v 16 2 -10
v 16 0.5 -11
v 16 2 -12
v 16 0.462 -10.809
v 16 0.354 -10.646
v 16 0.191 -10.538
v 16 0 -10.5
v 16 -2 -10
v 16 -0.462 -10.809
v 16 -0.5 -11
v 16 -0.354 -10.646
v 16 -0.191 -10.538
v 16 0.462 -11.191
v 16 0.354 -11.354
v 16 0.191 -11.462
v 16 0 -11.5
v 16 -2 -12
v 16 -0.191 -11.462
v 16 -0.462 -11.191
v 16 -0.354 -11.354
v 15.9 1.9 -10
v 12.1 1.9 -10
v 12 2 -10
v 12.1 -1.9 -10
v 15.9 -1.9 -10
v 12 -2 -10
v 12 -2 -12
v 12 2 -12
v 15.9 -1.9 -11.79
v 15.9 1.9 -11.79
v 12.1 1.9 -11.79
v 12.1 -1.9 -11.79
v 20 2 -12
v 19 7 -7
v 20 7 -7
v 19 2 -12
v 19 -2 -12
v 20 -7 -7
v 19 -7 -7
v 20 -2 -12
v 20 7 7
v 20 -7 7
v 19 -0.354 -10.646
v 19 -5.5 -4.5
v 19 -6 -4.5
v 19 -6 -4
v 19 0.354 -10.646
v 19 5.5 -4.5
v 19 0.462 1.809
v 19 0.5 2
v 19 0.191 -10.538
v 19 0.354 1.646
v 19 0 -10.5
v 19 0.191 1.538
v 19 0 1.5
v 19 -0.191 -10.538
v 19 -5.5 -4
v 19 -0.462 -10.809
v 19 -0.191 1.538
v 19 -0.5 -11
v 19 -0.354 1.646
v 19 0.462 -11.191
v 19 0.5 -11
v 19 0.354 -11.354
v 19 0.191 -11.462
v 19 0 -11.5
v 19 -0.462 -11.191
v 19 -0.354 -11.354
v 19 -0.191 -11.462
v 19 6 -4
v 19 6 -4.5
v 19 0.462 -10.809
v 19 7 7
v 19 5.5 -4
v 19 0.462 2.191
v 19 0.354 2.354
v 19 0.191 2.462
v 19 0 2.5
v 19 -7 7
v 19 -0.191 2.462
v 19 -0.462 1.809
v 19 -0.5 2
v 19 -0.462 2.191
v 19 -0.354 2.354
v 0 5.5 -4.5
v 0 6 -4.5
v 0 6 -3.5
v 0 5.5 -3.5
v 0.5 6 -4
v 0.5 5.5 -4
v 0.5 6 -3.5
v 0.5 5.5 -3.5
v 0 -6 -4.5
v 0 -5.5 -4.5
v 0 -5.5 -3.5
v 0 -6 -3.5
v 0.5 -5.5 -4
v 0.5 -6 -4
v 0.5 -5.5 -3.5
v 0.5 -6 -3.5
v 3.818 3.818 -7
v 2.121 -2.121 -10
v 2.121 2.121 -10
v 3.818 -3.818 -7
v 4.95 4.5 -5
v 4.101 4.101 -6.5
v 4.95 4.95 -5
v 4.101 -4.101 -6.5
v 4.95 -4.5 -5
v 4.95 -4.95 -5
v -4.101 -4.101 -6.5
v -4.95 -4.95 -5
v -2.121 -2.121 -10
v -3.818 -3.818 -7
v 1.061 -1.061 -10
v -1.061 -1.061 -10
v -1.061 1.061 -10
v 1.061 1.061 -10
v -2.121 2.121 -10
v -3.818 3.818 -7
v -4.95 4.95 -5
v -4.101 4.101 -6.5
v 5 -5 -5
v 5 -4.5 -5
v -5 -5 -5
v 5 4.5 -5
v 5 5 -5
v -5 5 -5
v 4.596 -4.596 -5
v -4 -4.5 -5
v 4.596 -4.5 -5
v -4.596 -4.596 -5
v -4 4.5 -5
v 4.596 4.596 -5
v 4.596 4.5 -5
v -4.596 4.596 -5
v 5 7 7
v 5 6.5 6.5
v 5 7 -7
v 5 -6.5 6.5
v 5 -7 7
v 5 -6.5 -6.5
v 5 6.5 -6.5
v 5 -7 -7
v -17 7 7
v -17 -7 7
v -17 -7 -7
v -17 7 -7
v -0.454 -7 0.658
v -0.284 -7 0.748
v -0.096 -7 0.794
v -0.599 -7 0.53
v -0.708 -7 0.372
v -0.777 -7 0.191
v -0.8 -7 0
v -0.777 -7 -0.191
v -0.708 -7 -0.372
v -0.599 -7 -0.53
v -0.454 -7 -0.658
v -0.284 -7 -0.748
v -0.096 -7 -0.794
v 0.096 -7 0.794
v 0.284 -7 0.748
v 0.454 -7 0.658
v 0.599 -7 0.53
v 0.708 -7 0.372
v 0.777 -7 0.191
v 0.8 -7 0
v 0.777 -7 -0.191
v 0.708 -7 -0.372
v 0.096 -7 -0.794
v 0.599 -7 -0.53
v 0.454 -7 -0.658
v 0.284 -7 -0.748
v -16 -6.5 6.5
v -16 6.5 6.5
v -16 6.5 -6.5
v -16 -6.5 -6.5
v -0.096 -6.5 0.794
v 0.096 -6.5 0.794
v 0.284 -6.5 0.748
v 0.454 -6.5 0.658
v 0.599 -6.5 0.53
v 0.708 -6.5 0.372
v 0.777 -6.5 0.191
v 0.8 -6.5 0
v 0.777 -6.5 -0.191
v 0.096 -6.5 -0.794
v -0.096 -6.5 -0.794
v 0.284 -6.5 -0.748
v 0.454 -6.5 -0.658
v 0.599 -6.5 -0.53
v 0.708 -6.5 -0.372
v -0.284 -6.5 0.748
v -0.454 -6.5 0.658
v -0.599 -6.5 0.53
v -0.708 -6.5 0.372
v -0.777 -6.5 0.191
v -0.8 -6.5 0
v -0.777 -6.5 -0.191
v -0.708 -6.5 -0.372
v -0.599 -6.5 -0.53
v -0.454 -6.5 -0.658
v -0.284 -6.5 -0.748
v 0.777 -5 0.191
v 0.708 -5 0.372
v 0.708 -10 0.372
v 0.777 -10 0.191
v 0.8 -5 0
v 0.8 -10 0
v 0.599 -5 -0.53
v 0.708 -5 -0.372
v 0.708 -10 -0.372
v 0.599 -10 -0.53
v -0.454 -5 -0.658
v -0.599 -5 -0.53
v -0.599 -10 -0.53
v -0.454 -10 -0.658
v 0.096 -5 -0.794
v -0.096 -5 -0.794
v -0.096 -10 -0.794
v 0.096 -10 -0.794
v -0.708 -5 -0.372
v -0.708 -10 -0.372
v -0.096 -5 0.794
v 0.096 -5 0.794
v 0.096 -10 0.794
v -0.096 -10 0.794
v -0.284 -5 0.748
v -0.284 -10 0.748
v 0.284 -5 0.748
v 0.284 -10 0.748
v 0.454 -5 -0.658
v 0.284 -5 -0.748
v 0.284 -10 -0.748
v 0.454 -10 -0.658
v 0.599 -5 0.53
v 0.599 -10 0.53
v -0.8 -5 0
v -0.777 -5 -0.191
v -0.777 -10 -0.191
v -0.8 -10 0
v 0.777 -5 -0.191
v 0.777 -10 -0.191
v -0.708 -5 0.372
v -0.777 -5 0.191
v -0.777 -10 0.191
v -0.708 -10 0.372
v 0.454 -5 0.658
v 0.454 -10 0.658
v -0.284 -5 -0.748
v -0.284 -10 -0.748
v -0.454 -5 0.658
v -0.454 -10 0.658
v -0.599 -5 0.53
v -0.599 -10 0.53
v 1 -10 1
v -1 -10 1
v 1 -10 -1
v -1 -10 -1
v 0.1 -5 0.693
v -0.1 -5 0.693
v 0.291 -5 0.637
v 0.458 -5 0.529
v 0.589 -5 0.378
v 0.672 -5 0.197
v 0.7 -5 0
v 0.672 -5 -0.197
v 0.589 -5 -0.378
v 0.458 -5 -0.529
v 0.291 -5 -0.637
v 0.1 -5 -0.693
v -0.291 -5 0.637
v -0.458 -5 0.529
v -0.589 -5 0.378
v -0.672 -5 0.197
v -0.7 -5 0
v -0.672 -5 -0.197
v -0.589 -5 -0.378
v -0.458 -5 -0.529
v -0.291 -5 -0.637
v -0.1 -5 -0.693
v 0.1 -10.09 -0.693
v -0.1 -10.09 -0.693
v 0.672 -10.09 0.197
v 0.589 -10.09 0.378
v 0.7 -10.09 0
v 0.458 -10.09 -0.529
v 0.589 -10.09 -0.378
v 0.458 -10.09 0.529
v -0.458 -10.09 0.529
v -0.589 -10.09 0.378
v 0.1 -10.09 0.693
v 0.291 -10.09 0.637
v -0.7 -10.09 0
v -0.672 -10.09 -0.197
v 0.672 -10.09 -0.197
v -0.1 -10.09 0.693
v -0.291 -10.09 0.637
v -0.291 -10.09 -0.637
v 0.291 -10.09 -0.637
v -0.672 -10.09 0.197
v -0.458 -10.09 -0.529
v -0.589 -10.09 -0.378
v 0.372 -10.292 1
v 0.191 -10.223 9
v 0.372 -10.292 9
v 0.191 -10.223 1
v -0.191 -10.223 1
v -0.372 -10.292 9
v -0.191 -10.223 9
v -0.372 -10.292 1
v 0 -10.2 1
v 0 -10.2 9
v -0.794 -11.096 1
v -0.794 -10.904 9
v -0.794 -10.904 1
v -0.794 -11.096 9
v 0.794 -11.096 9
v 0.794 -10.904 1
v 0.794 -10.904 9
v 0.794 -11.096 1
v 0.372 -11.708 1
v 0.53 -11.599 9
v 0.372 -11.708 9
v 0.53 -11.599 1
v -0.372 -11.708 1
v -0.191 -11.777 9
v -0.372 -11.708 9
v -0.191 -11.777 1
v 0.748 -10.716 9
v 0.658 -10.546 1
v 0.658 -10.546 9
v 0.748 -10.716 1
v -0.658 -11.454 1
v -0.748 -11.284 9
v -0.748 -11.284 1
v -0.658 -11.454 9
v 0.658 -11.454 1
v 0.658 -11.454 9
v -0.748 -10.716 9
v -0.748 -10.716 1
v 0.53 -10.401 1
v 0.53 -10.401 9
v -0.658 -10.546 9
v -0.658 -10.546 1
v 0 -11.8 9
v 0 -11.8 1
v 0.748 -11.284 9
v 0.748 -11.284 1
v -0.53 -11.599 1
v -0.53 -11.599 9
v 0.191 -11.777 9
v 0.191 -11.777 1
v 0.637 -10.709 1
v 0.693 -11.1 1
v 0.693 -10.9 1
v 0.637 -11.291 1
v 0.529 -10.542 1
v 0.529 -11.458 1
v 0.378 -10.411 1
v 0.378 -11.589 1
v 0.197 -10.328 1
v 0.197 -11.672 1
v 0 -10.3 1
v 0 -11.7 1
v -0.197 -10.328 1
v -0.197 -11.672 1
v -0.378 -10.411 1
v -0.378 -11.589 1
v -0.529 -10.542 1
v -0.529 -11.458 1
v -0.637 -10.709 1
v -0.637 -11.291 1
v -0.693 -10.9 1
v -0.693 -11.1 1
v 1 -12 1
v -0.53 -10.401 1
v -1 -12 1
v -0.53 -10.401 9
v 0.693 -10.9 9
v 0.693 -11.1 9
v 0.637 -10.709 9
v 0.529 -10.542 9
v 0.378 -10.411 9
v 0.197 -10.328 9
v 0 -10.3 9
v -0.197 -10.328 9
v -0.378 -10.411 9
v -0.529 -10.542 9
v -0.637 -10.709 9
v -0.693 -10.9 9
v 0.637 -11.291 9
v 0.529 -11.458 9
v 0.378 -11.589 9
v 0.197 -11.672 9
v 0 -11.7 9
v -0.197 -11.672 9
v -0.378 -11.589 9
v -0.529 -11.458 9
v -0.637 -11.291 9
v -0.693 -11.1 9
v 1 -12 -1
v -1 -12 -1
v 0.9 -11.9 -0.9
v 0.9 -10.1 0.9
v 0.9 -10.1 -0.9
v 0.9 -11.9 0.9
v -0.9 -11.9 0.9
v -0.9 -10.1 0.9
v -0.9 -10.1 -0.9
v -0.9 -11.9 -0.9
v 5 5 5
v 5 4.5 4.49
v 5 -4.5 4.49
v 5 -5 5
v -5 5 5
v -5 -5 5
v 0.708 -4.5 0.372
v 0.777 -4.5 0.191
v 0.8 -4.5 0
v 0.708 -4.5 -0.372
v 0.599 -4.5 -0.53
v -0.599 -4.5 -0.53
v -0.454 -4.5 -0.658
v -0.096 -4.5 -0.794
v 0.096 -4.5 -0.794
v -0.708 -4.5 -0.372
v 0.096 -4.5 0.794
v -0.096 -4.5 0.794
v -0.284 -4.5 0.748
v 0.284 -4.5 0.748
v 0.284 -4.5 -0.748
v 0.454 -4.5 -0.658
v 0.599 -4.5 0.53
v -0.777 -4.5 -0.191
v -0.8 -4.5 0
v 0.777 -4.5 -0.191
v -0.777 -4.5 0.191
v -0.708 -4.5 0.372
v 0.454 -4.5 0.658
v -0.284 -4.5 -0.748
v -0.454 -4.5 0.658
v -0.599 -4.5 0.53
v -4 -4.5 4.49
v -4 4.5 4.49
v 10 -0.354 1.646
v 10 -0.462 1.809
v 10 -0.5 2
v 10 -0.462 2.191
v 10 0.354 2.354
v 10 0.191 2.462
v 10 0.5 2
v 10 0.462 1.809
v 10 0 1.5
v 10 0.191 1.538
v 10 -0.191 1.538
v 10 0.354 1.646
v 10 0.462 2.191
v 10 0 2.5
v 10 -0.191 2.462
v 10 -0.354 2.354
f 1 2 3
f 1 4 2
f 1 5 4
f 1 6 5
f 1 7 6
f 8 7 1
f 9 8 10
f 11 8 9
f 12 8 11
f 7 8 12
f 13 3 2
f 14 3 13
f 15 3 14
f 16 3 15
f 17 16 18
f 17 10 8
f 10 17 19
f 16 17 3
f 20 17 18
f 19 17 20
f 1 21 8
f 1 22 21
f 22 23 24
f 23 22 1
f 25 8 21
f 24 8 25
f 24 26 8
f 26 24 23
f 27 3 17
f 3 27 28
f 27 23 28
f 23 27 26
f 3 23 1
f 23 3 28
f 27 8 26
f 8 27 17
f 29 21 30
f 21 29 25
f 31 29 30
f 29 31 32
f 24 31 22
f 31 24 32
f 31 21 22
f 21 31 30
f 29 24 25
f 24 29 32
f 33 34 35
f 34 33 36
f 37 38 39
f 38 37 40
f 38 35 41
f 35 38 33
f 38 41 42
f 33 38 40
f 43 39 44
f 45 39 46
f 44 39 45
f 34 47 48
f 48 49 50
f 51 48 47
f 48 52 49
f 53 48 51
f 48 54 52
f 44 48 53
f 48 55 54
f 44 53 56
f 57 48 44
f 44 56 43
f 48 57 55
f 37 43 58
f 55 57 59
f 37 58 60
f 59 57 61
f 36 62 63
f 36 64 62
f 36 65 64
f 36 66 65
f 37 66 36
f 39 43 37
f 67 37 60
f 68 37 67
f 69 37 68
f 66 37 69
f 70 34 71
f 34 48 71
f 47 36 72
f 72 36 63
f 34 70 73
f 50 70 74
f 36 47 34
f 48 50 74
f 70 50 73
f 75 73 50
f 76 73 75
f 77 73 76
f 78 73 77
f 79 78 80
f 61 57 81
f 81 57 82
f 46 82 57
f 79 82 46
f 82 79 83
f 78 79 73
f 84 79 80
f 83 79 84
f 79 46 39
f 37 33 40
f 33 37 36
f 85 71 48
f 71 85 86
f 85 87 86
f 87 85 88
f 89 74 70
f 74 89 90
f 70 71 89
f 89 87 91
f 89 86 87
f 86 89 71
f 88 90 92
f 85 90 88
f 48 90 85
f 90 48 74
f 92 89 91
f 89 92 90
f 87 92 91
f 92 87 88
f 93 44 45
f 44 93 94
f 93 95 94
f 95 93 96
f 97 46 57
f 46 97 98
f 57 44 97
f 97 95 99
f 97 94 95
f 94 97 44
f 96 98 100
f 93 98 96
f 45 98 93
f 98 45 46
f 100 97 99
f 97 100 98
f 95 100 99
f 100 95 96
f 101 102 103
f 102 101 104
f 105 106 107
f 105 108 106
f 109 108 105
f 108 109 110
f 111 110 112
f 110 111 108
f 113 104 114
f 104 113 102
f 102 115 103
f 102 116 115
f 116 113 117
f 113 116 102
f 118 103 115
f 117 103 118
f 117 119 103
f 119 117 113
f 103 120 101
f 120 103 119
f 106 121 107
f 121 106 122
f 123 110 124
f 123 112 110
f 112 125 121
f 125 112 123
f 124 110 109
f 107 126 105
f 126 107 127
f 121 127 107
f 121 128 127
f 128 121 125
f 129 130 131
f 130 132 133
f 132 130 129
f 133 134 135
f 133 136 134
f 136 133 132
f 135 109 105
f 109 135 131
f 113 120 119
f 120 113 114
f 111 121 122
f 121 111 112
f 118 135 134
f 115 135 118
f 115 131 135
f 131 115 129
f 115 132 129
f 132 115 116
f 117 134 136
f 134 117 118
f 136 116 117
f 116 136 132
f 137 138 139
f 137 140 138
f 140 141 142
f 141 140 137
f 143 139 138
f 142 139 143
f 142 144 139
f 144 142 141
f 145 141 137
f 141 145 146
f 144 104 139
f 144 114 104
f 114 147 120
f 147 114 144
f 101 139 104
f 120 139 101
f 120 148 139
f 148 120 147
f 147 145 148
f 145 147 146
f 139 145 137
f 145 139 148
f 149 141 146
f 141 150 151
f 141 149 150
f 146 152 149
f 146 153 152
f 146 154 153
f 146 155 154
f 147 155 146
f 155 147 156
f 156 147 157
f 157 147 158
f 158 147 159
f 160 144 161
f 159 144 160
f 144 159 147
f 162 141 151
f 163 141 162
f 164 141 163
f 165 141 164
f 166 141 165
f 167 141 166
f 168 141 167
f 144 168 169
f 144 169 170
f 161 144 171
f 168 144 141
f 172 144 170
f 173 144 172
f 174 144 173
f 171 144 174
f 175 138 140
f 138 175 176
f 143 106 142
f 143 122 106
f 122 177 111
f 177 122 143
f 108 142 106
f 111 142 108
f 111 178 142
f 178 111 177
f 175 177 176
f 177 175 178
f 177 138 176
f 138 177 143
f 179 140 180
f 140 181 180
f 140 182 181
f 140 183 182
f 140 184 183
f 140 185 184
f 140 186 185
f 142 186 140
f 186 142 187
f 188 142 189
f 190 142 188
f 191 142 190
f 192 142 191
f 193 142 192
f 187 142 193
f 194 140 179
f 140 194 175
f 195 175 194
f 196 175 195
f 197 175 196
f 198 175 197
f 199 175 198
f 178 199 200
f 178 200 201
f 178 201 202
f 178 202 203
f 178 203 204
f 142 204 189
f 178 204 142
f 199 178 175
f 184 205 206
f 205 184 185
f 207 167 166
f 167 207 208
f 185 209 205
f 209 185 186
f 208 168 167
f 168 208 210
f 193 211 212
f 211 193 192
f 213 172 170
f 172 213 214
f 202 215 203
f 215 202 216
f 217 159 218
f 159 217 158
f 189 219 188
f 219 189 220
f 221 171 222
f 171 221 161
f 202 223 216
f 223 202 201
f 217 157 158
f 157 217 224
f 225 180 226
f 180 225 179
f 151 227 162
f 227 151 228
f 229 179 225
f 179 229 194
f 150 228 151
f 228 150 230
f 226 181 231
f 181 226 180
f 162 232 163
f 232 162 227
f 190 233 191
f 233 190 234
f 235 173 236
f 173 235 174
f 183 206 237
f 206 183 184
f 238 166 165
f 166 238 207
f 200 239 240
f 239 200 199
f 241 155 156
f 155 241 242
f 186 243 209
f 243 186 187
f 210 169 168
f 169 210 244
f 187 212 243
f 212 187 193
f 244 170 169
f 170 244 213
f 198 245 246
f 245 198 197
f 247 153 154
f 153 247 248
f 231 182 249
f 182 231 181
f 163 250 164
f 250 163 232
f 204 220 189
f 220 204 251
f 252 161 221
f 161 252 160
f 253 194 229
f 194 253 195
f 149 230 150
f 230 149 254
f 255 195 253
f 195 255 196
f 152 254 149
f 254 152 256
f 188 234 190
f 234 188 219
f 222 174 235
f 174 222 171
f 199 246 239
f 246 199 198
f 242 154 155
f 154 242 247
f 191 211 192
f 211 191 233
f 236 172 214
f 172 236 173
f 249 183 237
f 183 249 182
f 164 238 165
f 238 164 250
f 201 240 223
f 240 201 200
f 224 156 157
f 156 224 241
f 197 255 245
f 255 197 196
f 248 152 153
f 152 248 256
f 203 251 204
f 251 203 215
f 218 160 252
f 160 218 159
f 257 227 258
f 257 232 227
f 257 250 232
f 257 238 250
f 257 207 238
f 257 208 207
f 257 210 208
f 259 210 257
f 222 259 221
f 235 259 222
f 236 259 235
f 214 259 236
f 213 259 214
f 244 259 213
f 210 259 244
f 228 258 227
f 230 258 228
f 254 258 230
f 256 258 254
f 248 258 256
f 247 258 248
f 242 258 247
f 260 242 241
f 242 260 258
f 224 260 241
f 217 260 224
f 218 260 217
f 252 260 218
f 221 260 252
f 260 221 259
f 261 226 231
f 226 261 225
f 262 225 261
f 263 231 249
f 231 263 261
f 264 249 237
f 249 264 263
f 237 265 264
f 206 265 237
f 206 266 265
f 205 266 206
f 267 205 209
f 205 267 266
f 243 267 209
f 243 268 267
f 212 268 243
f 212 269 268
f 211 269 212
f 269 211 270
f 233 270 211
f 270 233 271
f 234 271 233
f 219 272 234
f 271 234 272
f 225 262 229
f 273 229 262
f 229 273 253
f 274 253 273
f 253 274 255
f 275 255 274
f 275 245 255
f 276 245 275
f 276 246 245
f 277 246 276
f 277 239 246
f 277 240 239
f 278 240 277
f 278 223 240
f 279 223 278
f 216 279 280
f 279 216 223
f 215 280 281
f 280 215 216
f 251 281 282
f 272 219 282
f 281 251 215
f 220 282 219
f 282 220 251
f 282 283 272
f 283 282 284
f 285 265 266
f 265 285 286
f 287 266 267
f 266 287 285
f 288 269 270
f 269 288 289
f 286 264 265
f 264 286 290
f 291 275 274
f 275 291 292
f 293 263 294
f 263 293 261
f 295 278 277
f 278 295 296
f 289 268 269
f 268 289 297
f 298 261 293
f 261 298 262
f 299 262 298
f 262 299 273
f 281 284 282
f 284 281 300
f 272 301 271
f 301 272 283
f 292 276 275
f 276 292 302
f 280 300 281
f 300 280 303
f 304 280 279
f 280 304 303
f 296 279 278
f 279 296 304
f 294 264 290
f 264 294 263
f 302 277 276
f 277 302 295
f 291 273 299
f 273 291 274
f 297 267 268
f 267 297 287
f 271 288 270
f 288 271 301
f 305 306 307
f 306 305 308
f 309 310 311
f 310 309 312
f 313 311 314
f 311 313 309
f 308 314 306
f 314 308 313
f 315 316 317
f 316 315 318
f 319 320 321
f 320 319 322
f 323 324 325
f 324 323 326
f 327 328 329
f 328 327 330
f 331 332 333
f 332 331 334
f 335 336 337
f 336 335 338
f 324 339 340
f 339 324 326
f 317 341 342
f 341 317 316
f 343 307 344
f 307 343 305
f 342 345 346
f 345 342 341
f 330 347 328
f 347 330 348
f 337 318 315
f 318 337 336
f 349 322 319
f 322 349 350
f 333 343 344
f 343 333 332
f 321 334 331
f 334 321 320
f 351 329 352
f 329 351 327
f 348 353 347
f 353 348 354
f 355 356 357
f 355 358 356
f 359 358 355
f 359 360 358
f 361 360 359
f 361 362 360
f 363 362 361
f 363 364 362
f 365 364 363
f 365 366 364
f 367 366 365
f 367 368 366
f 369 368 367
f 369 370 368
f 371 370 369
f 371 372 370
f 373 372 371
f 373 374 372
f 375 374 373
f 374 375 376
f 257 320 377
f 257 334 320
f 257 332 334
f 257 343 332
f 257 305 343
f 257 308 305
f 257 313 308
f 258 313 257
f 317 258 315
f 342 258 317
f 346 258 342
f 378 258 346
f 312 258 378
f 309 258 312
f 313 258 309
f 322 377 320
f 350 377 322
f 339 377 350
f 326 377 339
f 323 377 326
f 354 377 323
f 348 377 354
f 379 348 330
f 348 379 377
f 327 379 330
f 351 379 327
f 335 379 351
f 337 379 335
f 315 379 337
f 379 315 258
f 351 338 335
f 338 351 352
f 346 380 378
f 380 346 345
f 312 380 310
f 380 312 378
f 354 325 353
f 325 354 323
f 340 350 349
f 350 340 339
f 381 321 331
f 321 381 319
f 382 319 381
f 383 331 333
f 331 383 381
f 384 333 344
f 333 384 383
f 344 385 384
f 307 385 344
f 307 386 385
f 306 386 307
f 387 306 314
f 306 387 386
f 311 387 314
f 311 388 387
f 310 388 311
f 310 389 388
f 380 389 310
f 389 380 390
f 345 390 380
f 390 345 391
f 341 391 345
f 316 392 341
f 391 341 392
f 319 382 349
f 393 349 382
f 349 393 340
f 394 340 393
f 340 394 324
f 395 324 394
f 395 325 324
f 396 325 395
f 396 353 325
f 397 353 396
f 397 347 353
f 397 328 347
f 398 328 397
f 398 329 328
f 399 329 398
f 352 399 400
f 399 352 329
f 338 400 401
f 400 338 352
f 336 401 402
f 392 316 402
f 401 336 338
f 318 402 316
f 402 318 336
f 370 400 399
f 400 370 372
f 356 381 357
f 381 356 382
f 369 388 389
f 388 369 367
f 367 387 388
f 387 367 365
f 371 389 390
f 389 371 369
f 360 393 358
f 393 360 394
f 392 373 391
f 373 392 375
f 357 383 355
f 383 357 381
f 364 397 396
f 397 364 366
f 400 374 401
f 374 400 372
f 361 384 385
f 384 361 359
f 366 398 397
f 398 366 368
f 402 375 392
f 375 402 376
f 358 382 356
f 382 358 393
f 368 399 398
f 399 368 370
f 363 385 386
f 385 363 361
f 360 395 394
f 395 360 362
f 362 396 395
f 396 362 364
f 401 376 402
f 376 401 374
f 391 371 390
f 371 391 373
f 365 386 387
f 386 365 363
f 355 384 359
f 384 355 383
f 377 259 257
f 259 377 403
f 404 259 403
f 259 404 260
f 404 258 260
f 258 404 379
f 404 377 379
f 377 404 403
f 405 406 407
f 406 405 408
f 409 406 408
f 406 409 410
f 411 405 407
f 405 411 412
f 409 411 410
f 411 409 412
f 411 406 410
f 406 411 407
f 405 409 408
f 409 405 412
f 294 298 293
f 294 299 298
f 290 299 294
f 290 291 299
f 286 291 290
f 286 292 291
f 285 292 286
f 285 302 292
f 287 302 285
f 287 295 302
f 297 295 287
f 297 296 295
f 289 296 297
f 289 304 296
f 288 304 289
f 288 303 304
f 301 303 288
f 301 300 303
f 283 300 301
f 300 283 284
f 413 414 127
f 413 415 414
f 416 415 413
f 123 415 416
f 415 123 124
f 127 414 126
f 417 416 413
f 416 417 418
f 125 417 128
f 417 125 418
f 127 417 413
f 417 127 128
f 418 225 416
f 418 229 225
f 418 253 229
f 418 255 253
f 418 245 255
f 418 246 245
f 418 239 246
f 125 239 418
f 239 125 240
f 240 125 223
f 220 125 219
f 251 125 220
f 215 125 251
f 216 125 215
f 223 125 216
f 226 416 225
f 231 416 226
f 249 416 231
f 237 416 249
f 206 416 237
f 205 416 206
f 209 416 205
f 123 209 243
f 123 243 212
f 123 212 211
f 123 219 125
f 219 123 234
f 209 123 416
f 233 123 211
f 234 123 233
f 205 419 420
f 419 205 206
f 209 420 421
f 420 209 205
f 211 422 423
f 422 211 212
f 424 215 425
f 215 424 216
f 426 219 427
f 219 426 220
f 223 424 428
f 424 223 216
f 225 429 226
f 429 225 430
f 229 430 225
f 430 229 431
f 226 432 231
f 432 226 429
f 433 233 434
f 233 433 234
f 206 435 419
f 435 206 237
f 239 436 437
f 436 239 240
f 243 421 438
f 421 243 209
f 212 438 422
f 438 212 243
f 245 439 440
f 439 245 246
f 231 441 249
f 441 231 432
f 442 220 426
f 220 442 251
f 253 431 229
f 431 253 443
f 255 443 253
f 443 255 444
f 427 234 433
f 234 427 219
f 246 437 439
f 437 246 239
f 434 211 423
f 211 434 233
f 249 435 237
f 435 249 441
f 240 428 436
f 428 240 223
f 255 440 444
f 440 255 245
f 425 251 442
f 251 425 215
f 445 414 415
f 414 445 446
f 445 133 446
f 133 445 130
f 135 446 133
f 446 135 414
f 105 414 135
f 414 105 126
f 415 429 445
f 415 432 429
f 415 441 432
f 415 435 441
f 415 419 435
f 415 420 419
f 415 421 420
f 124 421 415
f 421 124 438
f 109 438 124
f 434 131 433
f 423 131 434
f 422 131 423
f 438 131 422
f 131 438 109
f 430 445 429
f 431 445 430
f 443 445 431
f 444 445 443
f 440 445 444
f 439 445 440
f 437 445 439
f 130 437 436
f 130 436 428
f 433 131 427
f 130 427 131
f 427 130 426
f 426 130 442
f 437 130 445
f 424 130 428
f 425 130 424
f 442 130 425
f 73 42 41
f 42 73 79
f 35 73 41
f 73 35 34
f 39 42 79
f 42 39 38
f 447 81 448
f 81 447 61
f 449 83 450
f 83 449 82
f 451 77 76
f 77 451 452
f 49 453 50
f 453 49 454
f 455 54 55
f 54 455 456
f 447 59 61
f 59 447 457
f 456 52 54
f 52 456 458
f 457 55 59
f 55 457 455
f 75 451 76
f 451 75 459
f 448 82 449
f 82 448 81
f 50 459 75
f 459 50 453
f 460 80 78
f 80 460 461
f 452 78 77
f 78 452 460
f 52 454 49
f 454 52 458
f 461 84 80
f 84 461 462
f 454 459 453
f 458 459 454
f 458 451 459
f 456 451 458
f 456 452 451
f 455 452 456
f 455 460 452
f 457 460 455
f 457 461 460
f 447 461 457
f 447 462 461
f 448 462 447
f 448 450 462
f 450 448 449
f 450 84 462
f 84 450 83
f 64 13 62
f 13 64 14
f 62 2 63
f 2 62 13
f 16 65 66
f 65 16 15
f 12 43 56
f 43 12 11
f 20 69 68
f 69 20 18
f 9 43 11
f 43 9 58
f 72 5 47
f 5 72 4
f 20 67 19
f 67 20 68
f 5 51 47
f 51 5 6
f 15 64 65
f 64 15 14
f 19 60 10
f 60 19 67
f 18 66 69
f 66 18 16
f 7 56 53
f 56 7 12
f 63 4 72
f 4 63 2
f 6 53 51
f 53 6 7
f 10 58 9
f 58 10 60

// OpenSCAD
translate([14,0,-11])
{
    difference()
    {
        cube([4,4,2], center = true);
        translate([0,0,0.21])
        cube([3.8,3.8,2], center = true);
    }
    }

translate([19,-7,-7])
cube([1,14,14]);

    difference()
    {
translate([19,0,-7])
    rotate([0,90,0])
cylinder(1,7,7,$fn=4);
translate([18.9,-2.5,-17])
cube([5,5,5]); 
    }
// door of furnace

rotate([0,90,0])
{    
translate([-2,0,10])
cylinder(r=0.5,h=9,$fa=0.2, $fs=0.2);
}
// hanger of aluminium

rotate([0,90,0])
{    
translate([11,0,16])
cylinder(r=0.5,h=3,$fa=0.2, $fs=0.2);
}


rotate([0,90,0])
{    
translate([4,5.5,0])
cube([0.5,0.5,19]);
translate([3.5,5.5,0])
cube([0.5,0.5,0.5]);
translate([4,-6,0])
cube([0.5,0.5,19]); 
translate([3.5,-6,0])
cube([0.5,0.5,0.5]);
}
// door rails


translate([0,0,0])
{
difference()
{
rotate([0,0,45])
{
translate([0,0,-10])
cylinder(5,3,7,$fn=4);
}
rotate([0,0,45])
{
translate([0,0,-11])
cylinder(8,0.5,8.5,$fn=4);
}
}
}
// piramid



#difference()
{ 
    translate([-6,0,0])
    cube([22,14,14], center=true);
    translate([-16,-6.5,-6.5])
    cube([22,13,13]);
    rotate([0,0,45])
{
translate([0,0,-9.99])
cylinder(5,3,7,$fn=4);
}
rotate([90,0,0])
cylinder(r=0.8,h=20,$fa=0.2, $fs=0.2);
}
difference()
{
rotate([90,0,0])
translate([0,0,5])
    cylinder(r=0.8,h=5,$fa=0.2, $fs=0.2);
    rotate([90,0,0])
translate([0,0,4.99])
    cylinder(r=0.7,h=5.1,$fa=0.2, $fs=0.2);
}
difference()
{
rotate([0,00,90])
translate([-11,0,1])
    cylinder(r=0.8,h=8,$fa=0.2, $fs=0.2);
    rotate([0,0,90])
translate([-11,0,1])
    cylinder(r=0.7,h=8.1,$fa=0.2, $fs=0.2);
}
difference()
{
translate([0,-11,0])
cube([2,2,2], center=true);
  translate([0,-11,0])
 cube([1.8,1.8,1.8], center=true); 
      rotate([0,0,90])
translate([-11,0,1])
    cylinder(r=0.7,h=8.1,$fa=0.2, $fs=0.2);
       rotate([90,0,0])
translate([0,0,4.99])
    cylinder(r=0.7,h=5.1,$fa=0.2, $fs=0.2); 
}
//external frame

difference()
{ 
    cube([10,10,10], center=true);
    rotate([90,0,0])
    cylinder(r=0.8,h=20,$fa=0.2, $fs=0.2);
    translate([-4,-4.5,-5.01])
    cube([10,9,9.5]);
}
//internal frame
